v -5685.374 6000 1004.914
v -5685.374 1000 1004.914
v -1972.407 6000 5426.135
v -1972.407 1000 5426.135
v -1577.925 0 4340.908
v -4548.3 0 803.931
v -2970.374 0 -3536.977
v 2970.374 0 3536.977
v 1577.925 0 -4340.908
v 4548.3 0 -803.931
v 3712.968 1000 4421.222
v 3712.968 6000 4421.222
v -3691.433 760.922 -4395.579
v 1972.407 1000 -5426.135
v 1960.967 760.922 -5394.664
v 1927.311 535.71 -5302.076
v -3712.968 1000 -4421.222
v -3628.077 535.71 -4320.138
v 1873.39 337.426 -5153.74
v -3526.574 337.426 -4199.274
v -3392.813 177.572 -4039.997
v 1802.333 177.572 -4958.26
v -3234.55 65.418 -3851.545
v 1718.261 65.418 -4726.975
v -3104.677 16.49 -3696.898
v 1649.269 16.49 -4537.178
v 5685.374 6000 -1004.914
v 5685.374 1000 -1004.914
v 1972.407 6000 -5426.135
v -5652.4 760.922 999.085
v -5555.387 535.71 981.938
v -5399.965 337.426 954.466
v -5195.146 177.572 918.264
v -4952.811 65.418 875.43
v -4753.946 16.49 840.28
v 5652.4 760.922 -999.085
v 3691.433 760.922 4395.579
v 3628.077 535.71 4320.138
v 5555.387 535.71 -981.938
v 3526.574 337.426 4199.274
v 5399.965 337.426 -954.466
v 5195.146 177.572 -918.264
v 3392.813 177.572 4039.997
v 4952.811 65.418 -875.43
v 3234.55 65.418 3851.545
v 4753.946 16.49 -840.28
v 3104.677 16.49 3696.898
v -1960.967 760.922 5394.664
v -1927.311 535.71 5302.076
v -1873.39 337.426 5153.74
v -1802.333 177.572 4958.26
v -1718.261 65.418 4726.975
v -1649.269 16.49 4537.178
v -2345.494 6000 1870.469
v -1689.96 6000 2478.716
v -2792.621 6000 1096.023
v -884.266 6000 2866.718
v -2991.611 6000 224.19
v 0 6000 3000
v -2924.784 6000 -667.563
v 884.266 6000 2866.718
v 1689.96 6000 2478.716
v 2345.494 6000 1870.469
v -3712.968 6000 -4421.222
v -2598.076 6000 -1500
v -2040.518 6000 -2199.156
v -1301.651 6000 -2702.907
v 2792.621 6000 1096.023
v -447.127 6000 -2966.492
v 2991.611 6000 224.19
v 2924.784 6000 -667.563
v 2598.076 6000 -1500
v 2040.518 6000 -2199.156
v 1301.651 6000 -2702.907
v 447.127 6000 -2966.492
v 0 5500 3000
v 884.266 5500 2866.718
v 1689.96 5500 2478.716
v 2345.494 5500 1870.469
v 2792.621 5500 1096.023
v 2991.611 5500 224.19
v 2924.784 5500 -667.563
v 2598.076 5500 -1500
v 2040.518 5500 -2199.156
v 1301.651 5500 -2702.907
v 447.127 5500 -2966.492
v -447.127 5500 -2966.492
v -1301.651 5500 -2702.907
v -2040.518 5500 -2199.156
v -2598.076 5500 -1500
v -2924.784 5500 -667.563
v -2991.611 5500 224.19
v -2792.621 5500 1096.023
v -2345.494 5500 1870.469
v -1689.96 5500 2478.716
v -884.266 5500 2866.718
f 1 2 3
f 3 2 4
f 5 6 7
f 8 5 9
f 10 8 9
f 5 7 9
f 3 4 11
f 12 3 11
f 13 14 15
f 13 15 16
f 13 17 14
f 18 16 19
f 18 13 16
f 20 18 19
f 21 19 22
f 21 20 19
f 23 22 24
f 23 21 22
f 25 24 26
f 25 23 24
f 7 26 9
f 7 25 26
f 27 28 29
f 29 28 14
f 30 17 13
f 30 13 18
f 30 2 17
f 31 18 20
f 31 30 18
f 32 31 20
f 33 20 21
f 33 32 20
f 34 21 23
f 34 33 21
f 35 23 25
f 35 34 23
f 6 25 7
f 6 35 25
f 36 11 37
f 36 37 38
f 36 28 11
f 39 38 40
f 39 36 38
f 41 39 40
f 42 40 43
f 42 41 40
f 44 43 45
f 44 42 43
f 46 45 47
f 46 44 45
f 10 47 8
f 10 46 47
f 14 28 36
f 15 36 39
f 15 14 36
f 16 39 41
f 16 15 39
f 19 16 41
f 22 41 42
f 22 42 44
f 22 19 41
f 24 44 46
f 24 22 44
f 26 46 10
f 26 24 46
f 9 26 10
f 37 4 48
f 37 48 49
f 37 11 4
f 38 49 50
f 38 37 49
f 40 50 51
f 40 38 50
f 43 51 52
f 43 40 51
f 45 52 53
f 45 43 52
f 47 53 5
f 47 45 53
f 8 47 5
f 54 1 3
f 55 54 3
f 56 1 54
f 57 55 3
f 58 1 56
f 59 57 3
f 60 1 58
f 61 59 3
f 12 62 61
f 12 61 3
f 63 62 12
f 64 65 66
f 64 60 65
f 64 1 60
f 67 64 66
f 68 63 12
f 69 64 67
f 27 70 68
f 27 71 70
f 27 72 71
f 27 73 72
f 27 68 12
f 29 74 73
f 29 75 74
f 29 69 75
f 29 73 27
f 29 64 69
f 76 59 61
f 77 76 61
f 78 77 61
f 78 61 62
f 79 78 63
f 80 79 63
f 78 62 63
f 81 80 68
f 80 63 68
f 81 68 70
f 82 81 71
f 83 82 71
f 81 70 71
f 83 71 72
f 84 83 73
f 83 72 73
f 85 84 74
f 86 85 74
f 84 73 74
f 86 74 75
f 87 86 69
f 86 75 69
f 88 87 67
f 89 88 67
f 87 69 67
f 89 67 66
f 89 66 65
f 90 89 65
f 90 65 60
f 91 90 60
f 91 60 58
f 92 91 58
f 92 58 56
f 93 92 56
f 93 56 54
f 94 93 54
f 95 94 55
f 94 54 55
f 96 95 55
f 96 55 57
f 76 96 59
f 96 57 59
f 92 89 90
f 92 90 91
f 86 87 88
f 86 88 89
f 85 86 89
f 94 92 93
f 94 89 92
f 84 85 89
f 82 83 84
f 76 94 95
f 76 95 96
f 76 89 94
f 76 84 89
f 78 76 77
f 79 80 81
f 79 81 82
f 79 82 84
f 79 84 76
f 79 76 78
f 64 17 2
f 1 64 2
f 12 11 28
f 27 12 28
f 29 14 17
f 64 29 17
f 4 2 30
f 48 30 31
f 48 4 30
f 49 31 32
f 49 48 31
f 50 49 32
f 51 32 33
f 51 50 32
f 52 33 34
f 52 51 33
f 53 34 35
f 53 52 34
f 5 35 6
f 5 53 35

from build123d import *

# Parameters (mm, degrees)
BOSS_EXTRUDE2_DEPTH = 6000
FILLET2_R           = 1000
SKETCH4_R           = 3000
CUT_EXTRUDE2_DEPTH  = 500


with BuildPart() as part:
    # Sketch1 → Boss-Extrude2 (new body)
    with BuildSketch(Plane(origin=(0, 0, 0), x_dir=(1, 0, 0), z_dir=(0, 1, 0))):
        Polygon((3712.967882418, -4421.221871549), (5685.374397738, 1004.913573835), (1972.40651532, 5426.135445384), (-3712.967882418, 4421.221871549), (-5685.374397738, -1004.913573835), (-1972.40651532, -5426.135445384), align=None)
    extrude(amount=BOSS_EXTRUDE2_DEPTH)

    # Fillet2
    fillet2_edges = [part.edges().sort_by_distance(p)[0] for p in [
        (-3828.890456529, 0, 3215.52450961),
        (-4699.171140078, 0, -1708.154148857),
        (-870.280683549, 0, -4923.678658467),
        (3828.890456529, 0, -3215.52450961),
        (4699.171140078, 0, 1708.154148857),
        (870.280683549, 0, 4923.678658467),
    ]]
    fillet(fillet2_edges, radius=FILLET2_R)

    # Sketch4 → Cut-Extrude2 (cut)
    with BuildSketch(Plane(origin=(0, 6000, 0), x_dir=(1, 0, 0), z_dir=(0, 1, 0))):
        with Locations(Location((0, 0, 0), (0, 0, 270))):
            Circle(SKETCH4_R)
    extrude(amount=-CUT_EXTRUDE2_DEPTH, mode=Mode.SUBTRACT)


solid = part.part
